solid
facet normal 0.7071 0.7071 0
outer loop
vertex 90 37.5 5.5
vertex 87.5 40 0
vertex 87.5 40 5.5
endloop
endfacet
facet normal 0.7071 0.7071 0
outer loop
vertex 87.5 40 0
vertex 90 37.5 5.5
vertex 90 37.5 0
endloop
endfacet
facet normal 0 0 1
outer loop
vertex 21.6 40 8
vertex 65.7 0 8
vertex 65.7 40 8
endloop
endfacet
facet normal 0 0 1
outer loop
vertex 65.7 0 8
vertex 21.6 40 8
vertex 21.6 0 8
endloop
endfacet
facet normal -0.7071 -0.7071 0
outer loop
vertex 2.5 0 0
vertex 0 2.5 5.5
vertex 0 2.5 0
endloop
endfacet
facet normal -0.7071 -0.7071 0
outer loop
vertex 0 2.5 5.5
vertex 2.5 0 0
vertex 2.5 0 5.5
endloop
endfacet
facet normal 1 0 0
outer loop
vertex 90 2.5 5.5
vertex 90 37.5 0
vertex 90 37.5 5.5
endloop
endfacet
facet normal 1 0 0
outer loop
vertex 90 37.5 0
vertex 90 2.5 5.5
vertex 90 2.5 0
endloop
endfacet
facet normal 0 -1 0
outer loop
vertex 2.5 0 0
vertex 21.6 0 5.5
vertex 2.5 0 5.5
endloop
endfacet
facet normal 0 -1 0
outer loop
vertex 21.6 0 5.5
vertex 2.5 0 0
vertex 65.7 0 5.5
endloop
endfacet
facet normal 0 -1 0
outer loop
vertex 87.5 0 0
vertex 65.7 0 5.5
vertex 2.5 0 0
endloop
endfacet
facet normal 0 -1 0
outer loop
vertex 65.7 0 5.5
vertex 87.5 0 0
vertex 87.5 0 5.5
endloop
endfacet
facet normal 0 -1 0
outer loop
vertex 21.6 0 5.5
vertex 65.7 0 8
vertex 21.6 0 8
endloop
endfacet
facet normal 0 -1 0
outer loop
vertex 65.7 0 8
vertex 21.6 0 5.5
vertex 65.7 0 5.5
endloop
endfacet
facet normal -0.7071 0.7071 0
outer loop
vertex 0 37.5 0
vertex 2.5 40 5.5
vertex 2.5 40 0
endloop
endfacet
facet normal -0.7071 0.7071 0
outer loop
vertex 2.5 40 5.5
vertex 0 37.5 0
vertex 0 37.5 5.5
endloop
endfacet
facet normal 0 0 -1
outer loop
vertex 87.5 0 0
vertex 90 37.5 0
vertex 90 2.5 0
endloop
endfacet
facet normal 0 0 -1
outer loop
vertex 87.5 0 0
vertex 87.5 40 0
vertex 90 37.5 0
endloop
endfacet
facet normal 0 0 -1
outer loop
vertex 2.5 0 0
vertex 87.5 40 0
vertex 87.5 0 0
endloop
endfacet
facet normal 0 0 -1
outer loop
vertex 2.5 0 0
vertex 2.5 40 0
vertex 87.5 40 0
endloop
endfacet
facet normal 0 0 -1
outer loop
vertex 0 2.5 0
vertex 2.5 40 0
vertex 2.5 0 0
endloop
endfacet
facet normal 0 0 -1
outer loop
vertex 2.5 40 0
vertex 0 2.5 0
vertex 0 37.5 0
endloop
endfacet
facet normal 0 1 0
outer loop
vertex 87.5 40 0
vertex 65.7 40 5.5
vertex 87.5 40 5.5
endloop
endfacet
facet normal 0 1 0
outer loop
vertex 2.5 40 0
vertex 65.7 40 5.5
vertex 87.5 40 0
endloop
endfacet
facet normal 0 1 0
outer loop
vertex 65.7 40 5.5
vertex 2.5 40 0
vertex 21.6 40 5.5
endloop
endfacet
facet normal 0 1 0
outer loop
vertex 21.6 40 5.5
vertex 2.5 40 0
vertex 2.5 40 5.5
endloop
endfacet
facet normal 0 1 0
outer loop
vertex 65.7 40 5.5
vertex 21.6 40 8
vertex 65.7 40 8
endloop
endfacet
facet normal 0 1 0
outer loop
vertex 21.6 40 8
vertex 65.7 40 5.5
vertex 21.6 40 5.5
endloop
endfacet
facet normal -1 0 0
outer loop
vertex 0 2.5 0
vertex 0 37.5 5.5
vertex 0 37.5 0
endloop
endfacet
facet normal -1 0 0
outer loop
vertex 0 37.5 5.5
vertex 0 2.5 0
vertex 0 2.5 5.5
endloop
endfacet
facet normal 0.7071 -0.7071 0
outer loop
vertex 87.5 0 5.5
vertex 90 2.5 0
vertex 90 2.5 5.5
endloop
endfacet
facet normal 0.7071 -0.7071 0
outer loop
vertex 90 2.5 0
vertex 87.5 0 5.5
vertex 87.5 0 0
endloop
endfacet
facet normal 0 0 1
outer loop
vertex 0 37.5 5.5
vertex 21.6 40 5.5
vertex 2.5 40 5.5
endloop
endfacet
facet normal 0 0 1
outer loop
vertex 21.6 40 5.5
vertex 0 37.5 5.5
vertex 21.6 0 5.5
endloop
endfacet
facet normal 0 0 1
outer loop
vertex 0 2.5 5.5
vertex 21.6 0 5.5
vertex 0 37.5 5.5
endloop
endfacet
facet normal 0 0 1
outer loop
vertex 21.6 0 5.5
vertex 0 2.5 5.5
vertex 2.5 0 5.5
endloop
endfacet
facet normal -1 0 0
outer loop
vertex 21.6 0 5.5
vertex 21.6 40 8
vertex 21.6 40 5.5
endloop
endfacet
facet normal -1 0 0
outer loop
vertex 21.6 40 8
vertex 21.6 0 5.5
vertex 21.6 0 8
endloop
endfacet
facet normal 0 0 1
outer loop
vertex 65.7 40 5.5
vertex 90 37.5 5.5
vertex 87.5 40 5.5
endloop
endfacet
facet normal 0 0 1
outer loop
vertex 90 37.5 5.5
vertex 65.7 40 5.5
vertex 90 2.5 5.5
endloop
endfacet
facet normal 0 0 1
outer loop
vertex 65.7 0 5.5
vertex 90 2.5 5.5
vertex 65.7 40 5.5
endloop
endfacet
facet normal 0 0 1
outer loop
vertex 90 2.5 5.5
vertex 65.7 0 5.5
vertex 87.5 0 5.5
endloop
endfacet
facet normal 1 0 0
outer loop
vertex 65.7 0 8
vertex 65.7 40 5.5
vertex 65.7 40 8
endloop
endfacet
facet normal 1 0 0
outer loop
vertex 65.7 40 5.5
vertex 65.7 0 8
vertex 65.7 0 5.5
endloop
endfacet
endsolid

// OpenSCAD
$fn = 32;

// ----------------------------------------------------------------------
// Stepped bar: centerstep, 90 x 40 x 8/5.5 mm
// ----------------------------------------------------------------------

// --- parameters (mm) ---
bar_l = 90;               // bar length, X
bar_w = 40;               // bar width, Y
plate_t = 8;              // thickness of the thick zone, Z
thin_t = 5.5;             // thickness of the thin zone
corner_c = 2.5;           // corner chamfer of the bar
step_cut = 2.5;           // material removed from the thin zone
thick_from = 21.6;        // start of the thick middle zone
thick_to = 65.7;          // end of the thick middle zone
depth_1 = 2.5;            // depth of cut 1 from the top face
depth_2 = 2.5;            // depth of cut 2 from the top face

profile = [[2.5, 0], [87.5, 0], [90, 2.5], [90, 37.5], [87.5, 40], [2.5, 40], [0, 37.5], [0, 2.5]];  // primary outline, 8 points, counter clockwise
void_1 = [[-1, -1], [21.6, -1], [21.6, 41], [-1, 41]];  // thin left end, 4 points
void_2 = [[65.7, -1], [91, -1], [91, 41], [65.7, 41]];  // thin right end, 4 points

// --- the one profile operation ---
difference() {
  linear_extrude(height = plate_t) polygon(points = profile);
  translate([0, 0, plate_t - depth_1])
    linear_extrude(height = depth_1 + 1) polygon(points = void_1);
  translate([0, 0, plate_t - depth_2])
    linear_extrude(height = depth_2 + 1) polygon(points = void_2);
}
